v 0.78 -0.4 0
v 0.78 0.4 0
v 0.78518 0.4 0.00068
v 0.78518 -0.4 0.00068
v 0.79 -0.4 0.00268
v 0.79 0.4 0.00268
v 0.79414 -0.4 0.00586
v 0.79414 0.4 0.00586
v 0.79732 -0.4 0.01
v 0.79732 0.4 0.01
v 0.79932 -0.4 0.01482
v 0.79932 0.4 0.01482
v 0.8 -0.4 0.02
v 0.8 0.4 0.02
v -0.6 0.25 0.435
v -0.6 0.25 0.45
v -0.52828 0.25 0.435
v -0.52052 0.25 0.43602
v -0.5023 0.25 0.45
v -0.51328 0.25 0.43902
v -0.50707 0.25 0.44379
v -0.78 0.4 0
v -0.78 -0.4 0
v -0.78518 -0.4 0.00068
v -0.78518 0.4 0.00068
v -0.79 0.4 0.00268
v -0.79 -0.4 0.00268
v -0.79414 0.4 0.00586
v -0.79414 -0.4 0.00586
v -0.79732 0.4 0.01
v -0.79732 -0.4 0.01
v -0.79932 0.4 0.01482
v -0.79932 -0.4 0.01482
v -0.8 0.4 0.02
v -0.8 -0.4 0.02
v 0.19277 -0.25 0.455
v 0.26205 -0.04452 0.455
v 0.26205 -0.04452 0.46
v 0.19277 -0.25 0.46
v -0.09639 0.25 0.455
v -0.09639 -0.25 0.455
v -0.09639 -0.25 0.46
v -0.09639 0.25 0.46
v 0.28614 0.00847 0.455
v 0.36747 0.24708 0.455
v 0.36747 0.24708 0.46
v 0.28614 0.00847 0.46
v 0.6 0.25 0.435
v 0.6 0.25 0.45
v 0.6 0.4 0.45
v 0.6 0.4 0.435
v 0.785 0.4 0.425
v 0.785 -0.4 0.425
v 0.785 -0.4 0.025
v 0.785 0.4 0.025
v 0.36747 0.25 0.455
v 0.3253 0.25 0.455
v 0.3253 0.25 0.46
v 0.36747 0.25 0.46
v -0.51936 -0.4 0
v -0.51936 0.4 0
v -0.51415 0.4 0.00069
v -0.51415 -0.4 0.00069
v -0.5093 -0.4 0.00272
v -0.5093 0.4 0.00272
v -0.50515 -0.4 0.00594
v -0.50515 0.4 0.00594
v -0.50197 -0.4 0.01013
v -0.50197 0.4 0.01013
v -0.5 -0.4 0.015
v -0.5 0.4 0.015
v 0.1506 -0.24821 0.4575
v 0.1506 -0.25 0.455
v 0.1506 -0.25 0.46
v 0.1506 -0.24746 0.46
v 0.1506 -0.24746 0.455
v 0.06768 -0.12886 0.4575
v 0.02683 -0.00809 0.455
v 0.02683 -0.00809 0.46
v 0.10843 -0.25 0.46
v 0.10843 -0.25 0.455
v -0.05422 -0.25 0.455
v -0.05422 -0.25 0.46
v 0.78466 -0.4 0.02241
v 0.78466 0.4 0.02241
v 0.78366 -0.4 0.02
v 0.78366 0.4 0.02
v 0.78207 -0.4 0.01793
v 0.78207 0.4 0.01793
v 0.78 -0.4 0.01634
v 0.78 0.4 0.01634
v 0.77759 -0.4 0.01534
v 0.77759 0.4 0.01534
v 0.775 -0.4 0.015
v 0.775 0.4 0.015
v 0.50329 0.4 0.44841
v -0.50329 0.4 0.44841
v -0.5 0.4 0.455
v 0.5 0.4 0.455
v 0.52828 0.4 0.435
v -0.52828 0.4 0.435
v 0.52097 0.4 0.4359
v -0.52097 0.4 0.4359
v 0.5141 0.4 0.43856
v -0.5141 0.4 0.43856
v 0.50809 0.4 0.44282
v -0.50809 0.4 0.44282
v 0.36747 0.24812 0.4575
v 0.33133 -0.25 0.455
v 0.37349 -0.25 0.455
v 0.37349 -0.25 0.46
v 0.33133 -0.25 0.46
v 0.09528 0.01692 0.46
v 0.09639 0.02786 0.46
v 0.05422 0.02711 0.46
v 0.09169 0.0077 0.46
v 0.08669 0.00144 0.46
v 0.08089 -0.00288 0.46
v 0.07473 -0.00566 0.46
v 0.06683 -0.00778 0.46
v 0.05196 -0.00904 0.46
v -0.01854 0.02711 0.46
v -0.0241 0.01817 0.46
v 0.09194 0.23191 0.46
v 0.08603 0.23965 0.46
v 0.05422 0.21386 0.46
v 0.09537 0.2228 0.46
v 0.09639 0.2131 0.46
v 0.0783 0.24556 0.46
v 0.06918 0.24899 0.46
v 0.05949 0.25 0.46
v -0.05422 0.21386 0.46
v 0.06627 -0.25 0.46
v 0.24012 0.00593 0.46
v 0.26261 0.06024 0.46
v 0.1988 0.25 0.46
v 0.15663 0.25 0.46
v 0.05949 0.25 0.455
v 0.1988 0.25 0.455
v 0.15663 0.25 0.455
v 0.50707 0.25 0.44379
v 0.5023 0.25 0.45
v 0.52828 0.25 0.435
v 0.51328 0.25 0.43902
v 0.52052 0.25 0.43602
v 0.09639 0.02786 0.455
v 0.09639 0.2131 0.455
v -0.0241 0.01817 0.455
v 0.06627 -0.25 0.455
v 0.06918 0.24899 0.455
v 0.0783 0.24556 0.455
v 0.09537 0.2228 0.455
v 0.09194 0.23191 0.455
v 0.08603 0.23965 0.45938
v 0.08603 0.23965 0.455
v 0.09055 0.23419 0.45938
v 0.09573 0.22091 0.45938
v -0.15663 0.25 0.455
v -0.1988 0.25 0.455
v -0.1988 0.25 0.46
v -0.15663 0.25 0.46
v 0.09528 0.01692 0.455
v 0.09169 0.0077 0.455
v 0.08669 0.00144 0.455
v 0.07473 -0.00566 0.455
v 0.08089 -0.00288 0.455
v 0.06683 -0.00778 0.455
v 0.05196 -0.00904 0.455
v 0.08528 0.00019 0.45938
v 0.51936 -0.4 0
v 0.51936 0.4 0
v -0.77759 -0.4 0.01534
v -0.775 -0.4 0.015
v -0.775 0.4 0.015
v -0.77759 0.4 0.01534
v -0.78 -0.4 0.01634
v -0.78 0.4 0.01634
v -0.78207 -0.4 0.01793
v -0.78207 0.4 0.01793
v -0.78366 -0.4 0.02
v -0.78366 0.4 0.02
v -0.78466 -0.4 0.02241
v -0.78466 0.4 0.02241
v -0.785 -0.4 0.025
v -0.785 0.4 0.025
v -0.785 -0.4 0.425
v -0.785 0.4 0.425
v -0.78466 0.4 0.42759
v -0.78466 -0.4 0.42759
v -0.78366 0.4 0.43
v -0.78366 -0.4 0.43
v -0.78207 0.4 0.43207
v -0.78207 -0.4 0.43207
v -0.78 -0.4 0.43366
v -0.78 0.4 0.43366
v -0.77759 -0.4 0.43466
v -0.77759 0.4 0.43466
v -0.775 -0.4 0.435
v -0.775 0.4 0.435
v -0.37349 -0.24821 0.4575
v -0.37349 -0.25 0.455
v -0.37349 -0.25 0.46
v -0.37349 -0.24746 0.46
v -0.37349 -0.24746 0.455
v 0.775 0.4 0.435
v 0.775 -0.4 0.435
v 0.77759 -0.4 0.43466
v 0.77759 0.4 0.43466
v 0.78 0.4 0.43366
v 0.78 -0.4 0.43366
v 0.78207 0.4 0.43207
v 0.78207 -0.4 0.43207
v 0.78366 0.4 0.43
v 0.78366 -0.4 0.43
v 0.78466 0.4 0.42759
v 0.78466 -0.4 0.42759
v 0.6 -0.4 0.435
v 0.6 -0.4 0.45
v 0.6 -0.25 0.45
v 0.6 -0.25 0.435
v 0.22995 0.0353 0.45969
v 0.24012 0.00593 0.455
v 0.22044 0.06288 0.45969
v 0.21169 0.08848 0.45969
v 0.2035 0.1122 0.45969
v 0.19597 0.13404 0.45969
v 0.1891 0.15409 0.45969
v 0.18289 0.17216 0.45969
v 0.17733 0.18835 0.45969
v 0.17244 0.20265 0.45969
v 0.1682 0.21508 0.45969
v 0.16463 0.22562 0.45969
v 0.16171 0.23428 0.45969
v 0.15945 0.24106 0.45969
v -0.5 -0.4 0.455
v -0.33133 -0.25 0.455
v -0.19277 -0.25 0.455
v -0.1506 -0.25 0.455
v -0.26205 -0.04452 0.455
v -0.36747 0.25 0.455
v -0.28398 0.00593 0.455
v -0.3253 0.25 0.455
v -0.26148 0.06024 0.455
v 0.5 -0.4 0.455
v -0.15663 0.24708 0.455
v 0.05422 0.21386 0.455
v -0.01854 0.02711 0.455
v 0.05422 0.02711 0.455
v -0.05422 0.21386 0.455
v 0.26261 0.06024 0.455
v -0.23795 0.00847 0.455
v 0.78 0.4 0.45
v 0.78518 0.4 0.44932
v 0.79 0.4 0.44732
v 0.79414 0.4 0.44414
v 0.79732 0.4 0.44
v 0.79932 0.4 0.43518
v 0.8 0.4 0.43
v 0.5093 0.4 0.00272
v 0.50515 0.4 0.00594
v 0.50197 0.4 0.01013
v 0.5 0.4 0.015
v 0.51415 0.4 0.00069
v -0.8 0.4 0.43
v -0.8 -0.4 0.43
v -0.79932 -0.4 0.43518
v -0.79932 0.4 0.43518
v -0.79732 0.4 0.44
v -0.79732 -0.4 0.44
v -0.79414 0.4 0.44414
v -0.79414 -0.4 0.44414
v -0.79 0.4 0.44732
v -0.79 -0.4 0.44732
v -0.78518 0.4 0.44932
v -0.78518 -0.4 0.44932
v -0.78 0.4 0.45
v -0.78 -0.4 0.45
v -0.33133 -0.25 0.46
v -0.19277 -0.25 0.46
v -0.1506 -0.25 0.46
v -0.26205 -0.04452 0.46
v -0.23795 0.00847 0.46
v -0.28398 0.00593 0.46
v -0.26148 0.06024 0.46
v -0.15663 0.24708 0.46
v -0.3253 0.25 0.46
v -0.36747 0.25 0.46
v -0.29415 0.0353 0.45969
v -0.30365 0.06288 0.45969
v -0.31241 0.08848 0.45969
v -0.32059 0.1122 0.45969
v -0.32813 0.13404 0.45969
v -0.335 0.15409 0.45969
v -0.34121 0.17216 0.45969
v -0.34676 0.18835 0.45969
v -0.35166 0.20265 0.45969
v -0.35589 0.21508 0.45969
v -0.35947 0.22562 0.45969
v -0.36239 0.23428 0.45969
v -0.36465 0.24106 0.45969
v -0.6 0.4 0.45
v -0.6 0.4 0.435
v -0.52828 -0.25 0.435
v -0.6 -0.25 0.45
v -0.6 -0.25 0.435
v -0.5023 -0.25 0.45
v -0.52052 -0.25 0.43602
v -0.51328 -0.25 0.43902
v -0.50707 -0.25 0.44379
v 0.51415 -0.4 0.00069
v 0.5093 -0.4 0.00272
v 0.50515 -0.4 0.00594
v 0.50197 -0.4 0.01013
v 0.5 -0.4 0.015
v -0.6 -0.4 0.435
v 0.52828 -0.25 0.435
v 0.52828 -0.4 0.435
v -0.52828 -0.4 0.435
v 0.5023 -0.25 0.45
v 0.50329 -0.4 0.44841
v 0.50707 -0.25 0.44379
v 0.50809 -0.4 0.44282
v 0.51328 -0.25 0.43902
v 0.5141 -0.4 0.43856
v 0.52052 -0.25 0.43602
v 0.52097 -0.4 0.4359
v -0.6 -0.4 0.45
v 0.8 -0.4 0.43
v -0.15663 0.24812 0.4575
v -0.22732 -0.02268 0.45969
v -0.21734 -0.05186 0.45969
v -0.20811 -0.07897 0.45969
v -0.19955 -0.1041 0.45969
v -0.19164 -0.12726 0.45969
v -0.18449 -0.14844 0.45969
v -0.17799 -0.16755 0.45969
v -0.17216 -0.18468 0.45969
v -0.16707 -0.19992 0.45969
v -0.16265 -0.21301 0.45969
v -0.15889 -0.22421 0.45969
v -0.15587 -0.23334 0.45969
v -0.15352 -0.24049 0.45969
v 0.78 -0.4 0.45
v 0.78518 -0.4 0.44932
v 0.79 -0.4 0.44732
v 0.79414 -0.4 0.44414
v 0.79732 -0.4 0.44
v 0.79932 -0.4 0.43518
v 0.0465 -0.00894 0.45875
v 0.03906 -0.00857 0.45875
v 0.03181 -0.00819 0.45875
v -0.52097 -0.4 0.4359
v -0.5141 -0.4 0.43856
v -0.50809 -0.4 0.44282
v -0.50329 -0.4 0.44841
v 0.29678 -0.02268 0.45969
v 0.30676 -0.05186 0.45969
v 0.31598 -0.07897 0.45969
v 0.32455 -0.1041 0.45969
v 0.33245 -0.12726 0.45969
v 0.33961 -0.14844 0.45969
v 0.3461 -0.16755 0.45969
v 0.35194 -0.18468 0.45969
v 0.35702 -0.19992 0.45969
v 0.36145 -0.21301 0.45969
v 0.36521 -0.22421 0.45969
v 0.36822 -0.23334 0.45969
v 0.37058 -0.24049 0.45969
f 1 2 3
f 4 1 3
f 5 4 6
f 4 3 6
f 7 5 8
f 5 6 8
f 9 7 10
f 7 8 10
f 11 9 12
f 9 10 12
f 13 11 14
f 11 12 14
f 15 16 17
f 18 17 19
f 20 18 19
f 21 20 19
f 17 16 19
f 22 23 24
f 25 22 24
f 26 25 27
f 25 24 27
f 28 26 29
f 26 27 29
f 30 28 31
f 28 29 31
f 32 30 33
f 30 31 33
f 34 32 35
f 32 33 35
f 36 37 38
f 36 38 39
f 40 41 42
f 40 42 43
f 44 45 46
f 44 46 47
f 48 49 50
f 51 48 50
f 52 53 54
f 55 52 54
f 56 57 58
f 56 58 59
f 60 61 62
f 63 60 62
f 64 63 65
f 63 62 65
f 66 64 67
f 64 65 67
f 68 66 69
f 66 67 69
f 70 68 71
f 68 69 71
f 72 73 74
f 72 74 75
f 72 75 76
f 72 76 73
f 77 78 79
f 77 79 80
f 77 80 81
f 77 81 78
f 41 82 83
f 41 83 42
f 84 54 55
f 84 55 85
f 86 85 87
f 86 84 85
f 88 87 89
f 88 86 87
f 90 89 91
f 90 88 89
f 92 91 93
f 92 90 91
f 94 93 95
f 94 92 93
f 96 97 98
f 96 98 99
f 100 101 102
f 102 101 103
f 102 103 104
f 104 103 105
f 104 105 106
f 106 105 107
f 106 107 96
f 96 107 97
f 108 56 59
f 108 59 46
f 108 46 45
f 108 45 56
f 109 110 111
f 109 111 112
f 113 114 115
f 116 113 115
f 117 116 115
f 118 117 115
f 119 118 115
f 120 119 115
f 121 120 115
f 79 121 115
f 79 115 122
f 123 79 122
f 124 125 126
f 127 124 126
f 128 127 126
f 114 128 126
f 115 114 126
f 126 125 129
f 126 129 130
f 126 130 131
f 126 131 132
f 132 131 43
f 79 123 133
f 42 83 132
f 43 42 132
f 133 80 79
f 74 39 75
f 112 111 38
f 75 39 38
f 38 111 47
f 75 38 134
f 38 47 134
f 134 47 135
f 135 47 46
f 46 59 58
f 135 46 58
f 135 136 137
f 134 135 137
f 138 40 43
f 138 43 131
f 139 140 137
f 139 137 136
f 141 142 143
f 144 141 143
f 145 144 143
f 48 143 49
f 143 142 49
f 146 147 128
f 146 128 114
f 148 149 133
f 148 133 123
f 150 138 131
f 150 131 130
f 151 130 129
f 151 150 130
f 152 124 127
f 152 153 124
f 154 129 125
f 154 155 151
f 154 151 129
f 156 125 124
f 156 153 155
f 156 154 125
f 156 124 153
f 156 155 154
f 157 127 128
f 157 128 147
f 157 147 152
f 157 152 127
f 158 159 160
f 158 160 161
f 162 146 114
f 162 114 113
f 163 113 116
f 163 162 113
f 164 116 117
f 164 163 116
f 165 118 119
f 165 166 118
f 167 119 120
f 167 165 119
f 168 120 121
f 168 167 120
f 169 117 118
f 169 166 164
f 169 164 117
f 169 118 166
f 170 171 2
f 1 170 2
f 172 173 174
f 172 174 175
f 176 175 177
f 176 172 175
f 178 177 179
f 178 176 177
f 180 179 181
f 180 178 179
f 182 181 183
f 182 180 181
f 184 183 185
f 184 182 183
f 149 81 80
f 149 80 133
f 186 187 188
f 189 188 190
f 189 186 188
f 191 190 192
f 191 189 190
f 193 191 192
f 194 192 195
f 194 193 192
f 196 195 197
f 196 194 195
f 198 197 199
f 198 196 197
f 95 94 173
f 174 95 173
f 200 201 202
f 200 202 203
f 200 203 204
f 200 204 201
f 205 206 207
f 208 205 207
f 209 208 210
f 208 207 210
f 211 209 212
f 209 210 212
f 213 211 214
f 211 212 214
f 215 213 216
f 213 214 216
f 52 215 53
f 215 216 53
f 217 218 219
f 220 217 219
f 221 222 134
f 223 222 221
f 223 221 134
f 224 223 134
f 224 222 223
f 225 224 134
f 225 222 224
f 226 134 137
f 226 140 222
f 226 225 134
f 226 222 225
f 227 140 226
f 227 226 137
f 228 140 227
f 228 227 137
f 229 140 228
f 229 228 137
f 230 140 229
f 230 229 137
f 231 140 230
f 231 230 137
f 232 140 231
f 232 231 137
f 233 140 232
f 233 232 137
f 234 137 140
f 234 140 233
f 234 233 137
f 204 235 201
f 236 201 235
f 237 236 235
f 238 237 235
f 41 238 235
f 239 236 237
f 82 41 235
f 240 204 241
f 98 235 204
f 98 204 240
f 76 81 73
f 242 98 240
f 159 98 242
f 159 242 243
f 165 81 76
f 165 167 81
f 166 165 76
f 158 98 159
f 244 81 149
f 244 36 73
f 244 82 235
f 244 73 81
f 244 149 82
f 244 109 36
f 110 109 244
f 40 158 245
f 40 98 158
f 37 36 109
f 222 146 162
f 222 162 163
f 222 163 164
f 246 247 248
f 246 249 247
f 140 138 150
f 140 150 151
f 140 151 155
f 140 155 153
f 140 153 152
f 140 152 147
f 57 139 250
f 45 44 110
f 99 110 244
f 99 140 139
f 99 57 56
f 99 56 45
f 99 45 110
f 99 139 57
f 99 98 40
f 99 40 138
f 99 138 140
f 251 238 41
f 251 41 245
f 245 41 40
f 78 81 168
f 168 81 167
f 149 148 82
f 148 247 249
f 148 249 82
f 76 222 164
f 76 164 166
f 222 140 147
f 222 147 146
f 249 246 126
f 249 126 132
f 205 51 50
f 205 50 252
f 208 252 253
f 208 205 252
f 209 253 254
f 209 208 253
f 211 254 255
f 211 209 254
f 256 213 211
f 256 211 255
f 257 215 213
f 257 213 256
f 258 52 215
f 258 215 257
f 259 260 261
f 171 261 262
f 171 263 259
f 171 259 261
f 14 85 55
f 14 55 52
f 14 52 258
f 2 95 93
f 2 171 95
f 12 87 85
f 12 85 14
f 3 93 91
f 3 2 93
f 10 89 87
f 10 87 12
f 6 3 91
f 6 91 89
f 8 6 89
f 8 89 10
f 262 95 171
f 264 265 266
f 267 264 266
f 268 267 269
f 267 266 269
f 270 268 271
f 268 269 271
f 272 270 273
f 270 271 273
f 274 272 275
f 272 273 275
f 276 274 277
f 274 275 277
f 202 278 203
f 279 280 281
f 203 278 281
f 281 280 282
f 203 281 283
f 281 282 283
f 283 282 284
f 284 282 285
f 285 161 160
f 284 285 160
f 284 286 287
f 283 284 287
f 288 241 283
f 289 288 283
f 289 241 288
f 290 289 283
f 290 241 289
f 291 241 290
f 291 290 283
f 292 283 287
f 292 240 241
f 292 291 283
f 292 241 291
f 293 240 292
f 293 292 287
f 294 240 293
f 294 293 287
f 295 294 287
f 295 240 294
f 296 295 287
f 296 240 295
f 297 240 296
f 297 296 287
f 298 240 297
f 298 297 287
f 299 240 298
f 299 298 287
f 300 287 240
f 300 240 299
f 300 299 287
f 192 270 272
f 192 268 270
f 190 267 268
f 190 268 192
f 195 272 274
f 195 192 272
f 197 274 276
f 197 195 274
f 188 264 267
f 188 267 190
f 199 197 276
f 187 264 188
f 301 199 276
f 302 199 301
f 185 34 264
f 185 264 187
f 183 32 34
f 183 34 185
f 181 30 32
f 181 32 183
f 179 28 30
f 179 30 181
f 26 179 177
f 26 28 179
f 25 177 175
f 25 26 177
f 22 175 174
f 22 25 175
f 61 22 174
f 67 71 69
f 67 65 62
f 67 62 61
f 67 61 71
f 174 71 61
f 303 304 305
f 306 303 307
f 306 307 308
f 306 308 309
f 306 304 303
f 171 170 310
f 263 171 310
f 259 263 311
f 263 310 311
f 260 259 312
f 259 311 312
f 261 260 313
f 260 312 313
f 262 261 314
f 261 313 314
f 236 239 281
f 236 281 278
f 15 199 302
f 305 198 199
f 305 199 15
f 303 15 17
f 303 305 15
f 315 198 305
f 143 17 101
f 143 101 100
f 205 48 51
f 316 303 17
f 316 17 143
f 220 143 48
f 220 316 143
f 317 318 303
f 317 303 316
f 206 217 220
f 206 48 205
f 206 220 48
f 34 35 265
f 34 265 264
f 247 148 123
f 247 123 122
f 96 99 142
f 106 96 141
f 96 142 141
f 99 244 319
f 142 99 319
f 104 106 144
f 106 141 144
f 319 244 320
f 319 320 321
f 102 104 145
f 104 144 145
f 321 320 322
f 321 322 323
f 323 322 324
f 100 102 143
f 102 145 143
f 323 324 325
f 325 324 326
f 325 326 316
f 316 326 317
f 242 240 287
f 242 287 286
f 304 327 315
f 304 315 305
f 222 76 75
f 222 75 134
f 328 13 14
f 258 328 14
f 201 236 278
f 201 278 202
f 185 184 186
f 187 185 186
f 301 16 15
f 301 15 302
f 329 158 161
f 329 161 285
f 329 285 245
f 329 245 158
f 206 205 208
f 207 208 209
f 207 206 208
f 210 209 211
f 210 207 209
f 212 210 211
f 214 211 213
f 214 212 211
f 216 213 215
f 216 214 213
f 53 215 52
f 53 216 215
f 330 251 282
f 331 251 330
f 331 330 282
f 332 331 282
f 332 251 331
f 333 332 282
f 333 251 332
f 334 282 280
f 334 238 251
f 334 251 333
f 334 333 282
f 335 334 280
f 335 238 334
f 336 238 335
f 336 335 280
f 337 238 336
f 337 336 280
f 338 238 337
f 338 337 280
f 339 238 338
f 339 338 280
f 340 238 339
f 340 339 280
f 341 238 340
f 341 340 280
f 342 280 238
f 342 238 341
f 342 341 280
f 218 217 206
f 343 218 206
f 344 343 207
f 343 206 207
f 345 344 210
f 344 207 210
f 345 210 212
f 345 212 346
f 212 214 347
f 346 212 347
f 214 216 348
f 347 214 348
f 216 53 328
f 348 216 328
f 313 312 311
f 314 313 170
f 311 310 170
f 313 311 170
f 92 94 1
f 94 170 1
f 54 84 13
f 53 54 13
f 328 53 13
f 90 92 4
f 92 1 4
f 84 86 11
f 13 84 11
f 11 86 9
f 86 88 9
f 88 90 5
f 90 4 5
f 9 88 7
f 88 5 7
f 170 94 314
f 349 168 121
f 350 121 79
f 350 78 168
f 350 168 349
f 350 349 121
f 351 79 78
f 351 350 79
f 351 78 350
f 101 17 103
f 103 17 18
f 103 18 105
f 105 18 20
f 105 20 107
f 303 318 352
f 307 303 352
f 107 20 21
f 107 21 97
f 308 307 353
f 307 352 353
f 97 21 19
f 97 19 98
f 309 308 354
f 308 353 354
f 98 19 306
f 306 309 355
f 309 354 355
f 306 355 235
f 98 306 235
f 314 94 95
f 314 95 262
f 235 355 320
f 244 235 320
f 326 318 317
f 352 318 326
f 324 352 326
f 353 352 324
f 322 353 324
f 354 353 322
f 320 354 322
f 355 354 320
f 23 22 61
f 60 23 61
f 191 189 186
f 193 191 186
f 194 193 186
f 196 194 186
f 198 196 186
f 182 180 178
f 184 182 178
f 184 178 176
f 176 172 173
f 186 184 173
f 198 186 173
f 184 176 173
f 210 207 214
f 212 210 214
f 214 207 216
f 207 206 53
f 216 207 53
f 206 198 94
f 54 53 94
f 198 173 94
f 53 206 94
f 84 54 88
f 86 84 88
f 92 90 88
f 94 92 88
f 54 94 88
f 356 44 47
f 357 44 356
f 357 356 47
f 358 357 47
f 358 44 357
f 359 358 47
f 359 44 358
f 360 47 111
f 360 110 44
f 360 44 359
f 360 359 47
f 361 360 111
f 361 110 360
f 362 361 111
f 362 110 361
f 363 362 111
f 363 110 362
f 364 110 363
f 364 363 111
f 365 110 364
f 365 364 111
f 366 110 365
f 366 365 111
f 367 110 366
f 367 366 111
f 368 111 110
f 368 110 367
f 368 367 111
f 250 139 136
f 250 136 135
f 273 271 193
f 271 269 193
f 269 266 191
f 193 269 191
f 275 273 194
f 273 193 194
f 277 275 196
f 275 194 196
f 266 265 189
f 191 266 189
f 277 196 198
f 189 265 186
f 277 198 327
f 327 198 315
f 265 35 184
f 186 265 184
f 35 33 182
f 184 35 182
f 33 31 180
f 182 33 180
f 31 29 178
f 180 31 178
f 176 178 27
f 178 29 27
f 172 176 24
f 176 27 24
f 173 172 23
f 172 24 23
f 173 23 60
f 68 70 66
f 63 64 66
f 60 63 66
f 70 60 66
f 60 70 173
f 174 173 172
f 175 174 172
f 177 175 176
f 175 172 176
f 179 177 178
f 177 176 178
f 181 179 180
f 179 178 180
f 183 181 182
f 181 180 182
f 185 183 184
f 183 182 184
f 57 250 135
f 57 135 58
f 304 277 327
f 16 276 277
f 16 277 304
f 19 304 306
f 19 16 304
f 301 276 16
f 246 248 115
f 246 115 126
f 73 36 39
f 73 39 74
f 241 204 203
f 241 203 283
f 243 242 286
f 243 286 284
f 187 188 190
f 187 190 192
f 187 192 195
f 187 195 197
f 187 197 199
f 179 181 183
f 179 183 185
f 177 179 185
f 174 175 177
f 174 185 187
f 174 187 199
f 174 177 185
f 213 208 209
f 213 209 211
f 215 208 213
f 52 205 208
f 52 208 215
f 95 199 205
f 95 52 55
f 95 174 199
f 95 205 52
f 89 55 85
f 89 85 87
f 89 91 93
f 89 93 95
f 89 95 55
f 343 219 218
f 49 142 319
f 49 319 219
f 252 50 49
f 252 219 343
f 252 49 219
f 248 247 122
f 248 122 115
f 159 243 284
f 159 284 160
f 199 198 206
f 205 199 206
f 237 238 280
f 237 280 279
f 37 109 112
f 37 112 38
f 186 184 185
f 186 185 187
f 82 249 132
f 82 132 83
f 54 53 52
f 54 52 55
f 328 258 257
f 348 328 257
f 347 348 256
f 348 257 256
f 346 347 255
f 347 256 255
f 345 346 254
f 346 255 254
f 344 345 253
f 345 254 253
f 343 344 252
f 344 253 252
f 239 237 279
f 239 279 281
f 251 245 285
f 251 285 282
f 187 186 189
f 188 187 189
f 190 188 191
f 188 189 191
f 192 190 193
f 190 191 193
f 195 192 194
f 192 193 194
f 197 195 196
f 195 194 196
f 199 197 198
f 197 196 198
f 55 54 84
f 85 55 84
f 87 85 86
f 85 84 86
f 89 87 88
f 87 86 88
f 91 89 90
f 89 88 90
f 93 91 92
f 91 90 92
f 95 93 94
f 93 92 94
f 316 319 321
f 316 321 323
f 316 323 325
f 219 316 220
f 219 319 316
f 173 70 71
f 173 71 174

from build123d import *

# Parameters (mm, degrees)
SKETCH1_W                        = 1.6
SKETCH1_H                        = 0.8
ALL_BODY_EXTRUDE_DEPTH           = 0.45
SKETCH3_W                        = 1.2
SKETCH3_H                        = 0.15
CUT_OUT_FOR_PIN_UPPER_DEPTH      = 0.015
SKETCH2_W                        = 1
SKETCH2_H                        = 0.8
CUT_OUT_FOR_PIN_LOWER_DEPTH      = 0.015
SKETCH4_W                        = 1
SKETCH4_H                        = 0.8
COATING_EXTRUDE_DEPTH            = 0.02
COATING_START                    = -0.4
COATING_FILLET_DEPTH             = 0.8
BODY_CUT_OUT_FOR_TOTAL_PIN_DEPTH = 2.219436345
BODY_EXTRUDE_DEPTH               = 0.8
PIN_FILLET_R                     = 0.02
RESISTANT_VALUE_DEPTH            = 0.005


with BuildPart() as part:
    # Sketch1 → All body extrude (new body)
    with BuildSketch(Plane.XY):
        Rectangle(SKETCH1_W, SKETCH1_H)
    extrude(amount=ALL_BODY_EXTRUDE_DEPTH)

    # Sketch3 → Cut out for pin-upper (cut)
    with BuildSketch(Plane.XY.offset(0.45)):
        with Locations((0, 0.325)):
            Rectangle(SKETCH3_W, SKETCH3_H)
        with Locations((0, -0.325)):
            Rectangle(SKETCH3_W, SKETCH3_H)
    extrude(amount=-CUT_OUT_FOR_PIN_UPPER_DEPTH, mode=Mode.SUBTRACT)

    # Sketch2 → Cut out for pin-lower (cut)
    with BuildSketch(Plane(origin=(0, 0, 0), x_dir=(-1, 0, 0), z_dir=(0, 0, -1))):
        Rectangle(SKETCH2_W, SKETCH2_H)
    extrude(amount=-CUT_OUT_FOR_PIN_LOWER_DEPTH, mode=Mode.SUBTRACT)

    # Sketch4 → Coating extrude (add)
    with BuildSketch(Plane.XY.offset(0.435)):
        Rectangle(SKETCH4_W, SKETCH4_H)
    extrude(amount=COATING_EXTRUDE_DEPTH)

    # Coating fillet: read off the stored shape, not the designer's step
    # Coating fillet outline → Coating fillet (add)
    with BuildSketch(Plane(origin=(0, 0, 0), x_dir=(1, 0, 0), z_dir=(0, 1, 0)).offset(COATING_START)):
        with BuildLine():
            Line((-0.5, -0.435), (-0.528284271, -0.435))
            ThreePointArc((-0.528284271, -0.435), (-0.510963763, -0.440505103), (-0.5, -0.455))
            Line((-0.5, -0.455), (-0.5, -0.435))
        make_face()
        with BuildLine():
            ThreePointArc((0.5, -0.455), (0.510963763, -0.440505103), (0.528284271, -0.435))
            Line((0.528284271, -0.435), (0.5, -0.435))
            Line((0.5, -0.435), (0.5, -0.455))
        make_face()
    extrude(amount=COATING_FILLET_DEPTH)

    # Sketch6 → Body cut out for total pin (cut, through all)
    with BuildSketch(Plane.XZ.offset(0.4)):
        with BuildLine():
            Line((-0.775, 0.435), (0.775, 0.435))
            ThreePointArc((0.775, 0.435), (0.782071068, 0.432071068), (0.785, 0.425))
            Line((0.785, 0.425), (0.785, 0.025))
            ThreePointArc((0.785, 0.025), (0.782071068, 0.017928932), (0.775, 0.015))
            Line((0.775, 0.015), (-0.775, 0.015))
            ThreePointArc((-0.775, 0.015), (-0.782071068, 0.017928932), (-0.785, 0.025))
            Line((-0.785, 0.025), (-0.785, 0.425))
            ThreePointArc((-0.785, 0.425), (-0.782071068, 0.432071068), (-0.775, 0.435))
        make_face()
    extrude(amount=-BODY_CUT_OUT_FOR_TOTAL_PIN_DEPTH, mode=Mode.SUBTRACT)

    # Pin fillet
    # the kernel refuses this fillet: 0.02 mm, written as the material it takes off along each edge
    with BuildSketch(Plane(origin=(0.8, 0.45, 0.45), x_dir=(-1, 0, 0), z_dir=(0, -1, 0)), Plane(origin=(-0.8, -0.45, 0.45), x_dir=(1, 0, 0), z_dir=(0, 1, 0))) as pin_fillet_piece_1:
        with BuildLine():
            CenterArc((PIN_FILLET_R, PIN_FILLET_R), PIN_FILLET_R, 180, 90)
            Line((0, PIN_FILLET_R), (-PIN_FILLET_R * 0.02, PIN_FILLET_R))
            Line((-PIN_FILLET_R * 0.02, PIN_FILLET_R), (-PIN_FILLET_R * 0.02, -PIN_FILLET_R * 0.02))
            Line((-PIN_FILLET_R * 0.02, -PIN_FILLET_R * 0.02), (PIN_FILLET_R, -PIN_FILLET_R * 0.02))
            Line((PIN_FILLET_R, -PIN_FILLET_R * 0.02), (PIN_FILLET_R, 0))
        make_face()
    extrude(amount=0.9, mode=Mode.SUBTRACT)
    with BuildSketch(Plane(origin=(0.8, 0.45, 0), x_dir=(-1, 0, 0), z_dir=(0, -1, 0)), Plane(origin=(-0.8, -0.45, 0), x_dir=(1, 0, 0), z_dir=(0, 1, 0))) as pin_fillet_piece_2:
        with BuildLine():
            CenterArc((PIN_FILLET_R, -PIN_FILLET_R), PIN_FILLET_R, 90, 90)
            Line((0, -PIN_FILLET_R), (-PIN_FILLET_R * 0.02, -PIN_FILLET_R))
            Line((-PIN_FILLET_R * 0.02, -PIN_FILLET_R), (-PIN_FILLET_R * 0.02, PIN_FILLET_R * 0.02))
            Line((-PIN_FILLET_R * 0.02, PIN_FILLET_R * 0.02), (PIN_FILLET_R, PIN_FILLET_R * 0.02))
            Line((PIN_FILLET_R, PIN_FILLET_R * 0.02), (PIN_FILLET_R, 0))
        make_face()
    extrude(amount=0.9, mode=Mode.SUBTRACT)
    with BuildSketch(Plane(origin=(0.5, -0.448412292, 0), x_dir=(1, 0, 0), z_dir=(0, 1, 0)), Plane(origin=(-0.5, 0.448412292, 0), x_dir=(-1, 0, 0), z_dir=(0, -1, 0))) as pin_fillet_piece_3:
        with BuildLine():
            CenterArc((0.019364917, -0.02), PIN_FILLET_R, 90, 75.522487815)
            Line((0, -0.015), (-0.000387298, -0.0149))
            ThreePointArc((-0.000387298, -0.0149), (-0.0004, -0.0075), (-0.0004, 0))
            Line((-0.0004, 0), (0, 0.0004))
            Line((0, 0.0004), (0.019364917, 0.0004))
            Line((0.019364917, 0.0004), (0.019364917, 0))
        make_face()
    extrude(amount=0.896824584, mode=Mode.SUBTRACT)

    # Sketch21 → Resistant Value (add)
    with BuildSketch(Plane.XY.offset(0.455)):
        with BuildLine():
            Line((-0.15060241, -0.25), (-0.192771084, -0.25))
            Line((-0.192771084, -0.25), (-0.262048193, -0.044521837))
            Line((-0.262048193, -0.044521837), (-0.331325301, -0.25))
            Line((-0.331325301, -0.25), (-0.373493976, -0.25))
            add(Edge.make_bspline(
                [(-0.373493976, -0.25), (-0.373493976, -0.249403865), (-0.373493976, -0.248556727), (-0.373493976, -0.247709588), (-0.373493976, -0.247458584)],
                knots=[0, 0, 0, 0, 1.407407407, 2, 2, 2, 2], degree=3))
            Line((-0.373493976, -0.247458584), (-0.283979669, 0.00592997))
            add(Edge.make_bspline(
                [(-0.283979669, 0.00592997), (-0.287369221, 0.015718776), (-0.293940494, 0.034696181), (-0.303446592, 0.062202007), (-0.312168651, 0.087868229), (-0.320381964, 0.111568972), (-0.327929901, 0.133431579), (-0.334762854, 0.153430926), (-0.340996532, 0.171527269), (-0.34654818, 0.187717652), (-0.351444062, 0.202024454), (-0.355681131, 0.214448656), (-0.359258467, 0.224990776), (-0.362181609, 0.233648362), (-0.364427248, 0.240399454), (-0.366041932, 0.245256043), (-0.367040359, 0.248222645), (-0.367378694, 0.249622676), (-0.36746988, 0.25)],
                knots=[0, 0, 0, 0, 1.927553832, 3.736918121, 5.415158206, 6.971588422, 8.404311079, 9.718847863, 10.904156158, 11.965757829, 12.903653443, 13.717843825, 14.408330246, 14.975114804, 15.418201358, 15.732054334, 15.927785727, 16, 16, 16, 16], degree=3))
            Line((-0.36746988, 0.25), (-0.325301205, 0.25))
            Line((-0.325301205, 0.25), (-0.261483434, 0.060240964))
            Line((-0.261483434, 0.060240964), (-0.198795181, 0.25))
            Line((-0.198795181, 0.25), (-0.156626506, 0.25))
            add(Edge.make_bspline(
                [(-0.156626506, 0.25), (-0.156626506, 0.24937249), (-0.156626506, 0.248399849), (-0.156626506, 0.247427209), (-0.156626506, 0.247082078)],
                knots=[0, 0, 0, 0, 1.290322581, 2, 2, 2, 2], degree=3))
            Line((-0.156626506, 0.247082078), (-0.237951807, 0.008471386))
            add(Edge.make_bspline(
                [(-0.237951807, 0.008471386), (-0.234408977, -0.001914794), (-0.227547533, -0.022029835), (-0.217562137, -0.051164243), (-0.208340778, -0.078315791), (-0.199782271, -0.103449949), (-0.191844395, -0.126583788), (-0.184731148, -0.147755234), (-0.178229466, -0.166891911), (-0.172335744, -0.184024219), (-0.167338787, -0.199218059), (-0.162857649, -0.212376503), (-0.159104979, -0.223508598), (-0.156088206, -0.232679019), (-0.153744651, -0.239836115), (-0.152021819, -0.244993203), (-0.151051417, -0.248165867), (-0.1506947, -0.249623007), (-0.15060241, -0.25)],
                knots=[0, 0, 0, 0, 1.93058992, 3.738997214, 5.418215154, 6.975249619, 8.410101043, 9.72099315, 10.904472811, 11.965768803, 12.908346819, 13.718273231, 14.411244822, 14.975048819, 15.416667524, 15.73610151, 15.931723813, 16, 16, 16, 16], degree=3))
        make_face()
        with BuildLine():
            Line((0.108433735, -0.25), (0.06626506, -0.25))
            Line((0.06626506, -0.25), (-0.024096386, 0.018166416))
            Line((-0.024096386, 0.018166416), (-0.018542922, 0.027108434))
            Line((-0.018542922, 0.027108434), (0.054216867, 0.027108434))
            Line((0.054216867, 0.027108434), (0.054216867, 0.213855422))
            Line((0.054216867, 0.213855422), (-0.054216867, 0.213855422))
            Line((-0.054216867, 0.213855422), (-0.054216867, -0.25))
            Line((-0.054216867, -0.25), (-0.096385542, -0.25))
            Line((-0.096385542, -0.25), (-0.096385542, 0.25))
            Line((-0.096385542, 0.25), (0.059487952, 0.25))
            add(Edge.make_bspline(
                [(0.059487952, 0.25), (0.062103971, 0.249877071), (0.067127481, 0.249641012), (0.074331978, 0.247718101), (0.080709581, 0.244381847), (0.086177901, 0.239792359), (0.090767389, 0.234324039), (0.094103644, 0.227946436), (0.096026554, 0.220741939), (0.096262613, 0.215718429), (0.096385542, 0.21310241)],
                knots=[0, 0, 0, 0, 1.071910697, 2.058377219, 3.031150369, 4, 4.968849631, 5.941622781, 6.928089303, 8, 8, 8, 8], degree=3))
            Line((0.096385542, 0.21310241), (0.096385542, 0.027861446))
            add(Edge.make_bspline(
                [(0.096385542, 0.027861446), (0.096286982, 0.024959336), (0.09610082, 0.019477825), (0.093960612, 0.011801913), (0.090480524, 0.005210807), (0.085378935, -8.8619e-05), (0.078988486, -0.004252378), (0.071141568, -0.006967465), (0.062020416, -0.008806596), (0.055451353, -0.00895645), (0.051957831, -0.009036145)],
                knots=[0, 0, 0, 0, 1.052138315, 1.987280534, 2.870062918, 3.733182423, 4.631443151, 5.616429111, 6.732383034, 8, 8, 8, 8], degree=3))
            add(Edge.make_bspline(
                [(0.051957831, -0.009036145), (0.050137627, -0.009017433), (0.045835371, -0.008973205), (0.039124877, -0.008572511), (0.032571995, -0.008164128), (0.02848936, -0.008114925), (0.026826054, -0.00809488)],
                knots=[0, 0, 0, 0, 0.868317512, 2.052364952, 3.206514152, 4, 4, 4, 4], degree=3))
            add(Edge.make_bspline(
                [(0.026826054, -0.00809488), (0.040459525, -0.048344081), (0.067761401, -0.128945617), (0.09486473, -0.209614133), (0.108433735, -0.25)],
                knots=[0, 0, 0, 0, 0.998720468, 2, 2, 2, 2], degree=3))
        make_face()
        with BuildLine():
            Line((0.373493976, -0.25), (0.331325301, -0.25))
            Line((0.331325301, -0.25), (0.262048193, -0.044521837))
            Line((0.262048193, -0.044521837), (0.192771084, -0.25))
            Line((0.192771084, -0.25), (0.15060241, -0.25))
            add(Edge.make_bspline(
                [(0.15060241, -0.25), (0.15060241, -0.249403865), (0.15060241, -0.248556727), (0.15060241, -0.247709588), (0.15060241, -0.247458584)],
                knots=[0, 0, 0, 0, 1.407407407, 2, 2, 2, 2], degree=3))
            Line((0.15060241, -0.247458584), (0.240116717, 0.00592997))
            add(Edge.make_bspline(
                [(0.240116717, 0.00592997), (0.236727164, 0.015718776), (0.230155892, 0.034696181), (0.220649794, 0.062202007), (0.211927734, 0.087868229), (0.203714422, 0.111568972), (0.196166485, 0.133431579), (0.189333531, 0.153430926), (0.183099854, 0.171527269), (0.177548206, 0.187717652), (0.172652324, 0.202024454), (0.168415254, 0.214448656), (0.164837919, 0.224990776), (0.161914777, 0.233648362), (0.159669137, 0.240399454), (0.158054454, 0.245256043), (0.157056026, 0.248222645), (0.156717691, 0.249622676), (0.156626506, 0.25)],
                knots=[0, 0, 0, 0, 1.927553832, 3.736918121, 5.415158206, 6.971588422, 8.404311079, 9.718847863, 10.904156158, 11.965757829, 12.903653443, 13.717843825, 14.408330246, 14.975114804, 15.418201358, 15.732054334, 15.927785727, 16, 16, 16, 16], degree=3))
            Line((0.156626506, 0.25), (0.198795181, 0.25))
            Line((0.198795181, 0.25), (0.262612952, 0.060240964))
            Line((0.262612952, 0.060240964), (0.325301205, 0.25))
            Line((0.325301205, 0.25), (0.36746988, 0.25))
            add(Edge.make_bspline(
                [(0.36746988, 0.25), (0.36746988, 0.24937249), (0.36746988, 0.248399849), (0.36746988, 0.247427209), (0.36746988, 0.247082078)],
                knots=[0, 0, 0, 0, 1.290322581, 2, 2, 2, 2], degree=3))
            Line((0.36746988, 0.247082078), (0.286144578, 0.008471386))
            add(Edge.make_bspline(
                [(0.286144578, 0.008471386), (0.289687409, -0.001914794), (0.296548852, -0.022029835), (0.306534249, -0.051164243), (0.315755608, -0.078315791), (0.324314114, -0.103449949), (0.332251991, -0.126583788), (0.339365238, -0.147755234), (0.345866919, -0.166891911), (0.351760642, -0.184024219), (0.356757599, -0.199218059), (0.361238737, -0.212376503), (0.364991407, -0.223508598), (0.36800818, -0.232679019), (0.370351735, -0.239836115), (0.372074566, -0.244993203), (0.373044968, -0.248165867), (0.373401685, -0.249623007), (0.373493976, -0.25)],
                knots=[0, 0, 0, 0, 1.93058992, 3.738997214, 5.418215154, 6.975249619, 8.410101043, 9.72099315, 10.904472811, 11.965768803, 12.908346819, 13.718273231, 14.411244822, 14.975048819, 15.416667524, 15.73610151, 15.931723813, 16, 16, 16, 16], degree=3))
        make_face()
    extrude(amount=RESISTANT_VALUE_DEPTH)


with BuildPart() as body_2:
    # Sketch7 → Body extrude (new, through all)
    with BuildSketch(Plane(origin=(0, -0.4, 0), x_dir=(1, 0, 0), z_dir=(0, 1, 0))):
        with BuildLine():
            Line((-0.775, -0.435), (0.775, -0.435))
            ThreePointArc((0.775, -0.435), (0.782071068, -0.432071068), (0.785, -0.425))
            Line((0.785, -0.425), (0.785, -0.025))
            ThreePointArc((0.785, -0.025), (0.782071068, -0.017928932), (0.775, -0.015))
            Line((0.775, -0.015), (-0.775, -0.015))
            ThreePointArc((-0.775, -0.015), (-0.782071068, -0.017928932), (-0.785, -0.025))
            Line((-0.785, -0.025), (-0.785, -0.425))
            ThreePointArc((-0.785, -0.425), (-0.782071068, -0.432071068), (-0.775, -0.435))
        make_face()
    extrude(amount=BODY_EXTRUDE_DEPTH)


solid = Compound([part.part, body_2.part])
